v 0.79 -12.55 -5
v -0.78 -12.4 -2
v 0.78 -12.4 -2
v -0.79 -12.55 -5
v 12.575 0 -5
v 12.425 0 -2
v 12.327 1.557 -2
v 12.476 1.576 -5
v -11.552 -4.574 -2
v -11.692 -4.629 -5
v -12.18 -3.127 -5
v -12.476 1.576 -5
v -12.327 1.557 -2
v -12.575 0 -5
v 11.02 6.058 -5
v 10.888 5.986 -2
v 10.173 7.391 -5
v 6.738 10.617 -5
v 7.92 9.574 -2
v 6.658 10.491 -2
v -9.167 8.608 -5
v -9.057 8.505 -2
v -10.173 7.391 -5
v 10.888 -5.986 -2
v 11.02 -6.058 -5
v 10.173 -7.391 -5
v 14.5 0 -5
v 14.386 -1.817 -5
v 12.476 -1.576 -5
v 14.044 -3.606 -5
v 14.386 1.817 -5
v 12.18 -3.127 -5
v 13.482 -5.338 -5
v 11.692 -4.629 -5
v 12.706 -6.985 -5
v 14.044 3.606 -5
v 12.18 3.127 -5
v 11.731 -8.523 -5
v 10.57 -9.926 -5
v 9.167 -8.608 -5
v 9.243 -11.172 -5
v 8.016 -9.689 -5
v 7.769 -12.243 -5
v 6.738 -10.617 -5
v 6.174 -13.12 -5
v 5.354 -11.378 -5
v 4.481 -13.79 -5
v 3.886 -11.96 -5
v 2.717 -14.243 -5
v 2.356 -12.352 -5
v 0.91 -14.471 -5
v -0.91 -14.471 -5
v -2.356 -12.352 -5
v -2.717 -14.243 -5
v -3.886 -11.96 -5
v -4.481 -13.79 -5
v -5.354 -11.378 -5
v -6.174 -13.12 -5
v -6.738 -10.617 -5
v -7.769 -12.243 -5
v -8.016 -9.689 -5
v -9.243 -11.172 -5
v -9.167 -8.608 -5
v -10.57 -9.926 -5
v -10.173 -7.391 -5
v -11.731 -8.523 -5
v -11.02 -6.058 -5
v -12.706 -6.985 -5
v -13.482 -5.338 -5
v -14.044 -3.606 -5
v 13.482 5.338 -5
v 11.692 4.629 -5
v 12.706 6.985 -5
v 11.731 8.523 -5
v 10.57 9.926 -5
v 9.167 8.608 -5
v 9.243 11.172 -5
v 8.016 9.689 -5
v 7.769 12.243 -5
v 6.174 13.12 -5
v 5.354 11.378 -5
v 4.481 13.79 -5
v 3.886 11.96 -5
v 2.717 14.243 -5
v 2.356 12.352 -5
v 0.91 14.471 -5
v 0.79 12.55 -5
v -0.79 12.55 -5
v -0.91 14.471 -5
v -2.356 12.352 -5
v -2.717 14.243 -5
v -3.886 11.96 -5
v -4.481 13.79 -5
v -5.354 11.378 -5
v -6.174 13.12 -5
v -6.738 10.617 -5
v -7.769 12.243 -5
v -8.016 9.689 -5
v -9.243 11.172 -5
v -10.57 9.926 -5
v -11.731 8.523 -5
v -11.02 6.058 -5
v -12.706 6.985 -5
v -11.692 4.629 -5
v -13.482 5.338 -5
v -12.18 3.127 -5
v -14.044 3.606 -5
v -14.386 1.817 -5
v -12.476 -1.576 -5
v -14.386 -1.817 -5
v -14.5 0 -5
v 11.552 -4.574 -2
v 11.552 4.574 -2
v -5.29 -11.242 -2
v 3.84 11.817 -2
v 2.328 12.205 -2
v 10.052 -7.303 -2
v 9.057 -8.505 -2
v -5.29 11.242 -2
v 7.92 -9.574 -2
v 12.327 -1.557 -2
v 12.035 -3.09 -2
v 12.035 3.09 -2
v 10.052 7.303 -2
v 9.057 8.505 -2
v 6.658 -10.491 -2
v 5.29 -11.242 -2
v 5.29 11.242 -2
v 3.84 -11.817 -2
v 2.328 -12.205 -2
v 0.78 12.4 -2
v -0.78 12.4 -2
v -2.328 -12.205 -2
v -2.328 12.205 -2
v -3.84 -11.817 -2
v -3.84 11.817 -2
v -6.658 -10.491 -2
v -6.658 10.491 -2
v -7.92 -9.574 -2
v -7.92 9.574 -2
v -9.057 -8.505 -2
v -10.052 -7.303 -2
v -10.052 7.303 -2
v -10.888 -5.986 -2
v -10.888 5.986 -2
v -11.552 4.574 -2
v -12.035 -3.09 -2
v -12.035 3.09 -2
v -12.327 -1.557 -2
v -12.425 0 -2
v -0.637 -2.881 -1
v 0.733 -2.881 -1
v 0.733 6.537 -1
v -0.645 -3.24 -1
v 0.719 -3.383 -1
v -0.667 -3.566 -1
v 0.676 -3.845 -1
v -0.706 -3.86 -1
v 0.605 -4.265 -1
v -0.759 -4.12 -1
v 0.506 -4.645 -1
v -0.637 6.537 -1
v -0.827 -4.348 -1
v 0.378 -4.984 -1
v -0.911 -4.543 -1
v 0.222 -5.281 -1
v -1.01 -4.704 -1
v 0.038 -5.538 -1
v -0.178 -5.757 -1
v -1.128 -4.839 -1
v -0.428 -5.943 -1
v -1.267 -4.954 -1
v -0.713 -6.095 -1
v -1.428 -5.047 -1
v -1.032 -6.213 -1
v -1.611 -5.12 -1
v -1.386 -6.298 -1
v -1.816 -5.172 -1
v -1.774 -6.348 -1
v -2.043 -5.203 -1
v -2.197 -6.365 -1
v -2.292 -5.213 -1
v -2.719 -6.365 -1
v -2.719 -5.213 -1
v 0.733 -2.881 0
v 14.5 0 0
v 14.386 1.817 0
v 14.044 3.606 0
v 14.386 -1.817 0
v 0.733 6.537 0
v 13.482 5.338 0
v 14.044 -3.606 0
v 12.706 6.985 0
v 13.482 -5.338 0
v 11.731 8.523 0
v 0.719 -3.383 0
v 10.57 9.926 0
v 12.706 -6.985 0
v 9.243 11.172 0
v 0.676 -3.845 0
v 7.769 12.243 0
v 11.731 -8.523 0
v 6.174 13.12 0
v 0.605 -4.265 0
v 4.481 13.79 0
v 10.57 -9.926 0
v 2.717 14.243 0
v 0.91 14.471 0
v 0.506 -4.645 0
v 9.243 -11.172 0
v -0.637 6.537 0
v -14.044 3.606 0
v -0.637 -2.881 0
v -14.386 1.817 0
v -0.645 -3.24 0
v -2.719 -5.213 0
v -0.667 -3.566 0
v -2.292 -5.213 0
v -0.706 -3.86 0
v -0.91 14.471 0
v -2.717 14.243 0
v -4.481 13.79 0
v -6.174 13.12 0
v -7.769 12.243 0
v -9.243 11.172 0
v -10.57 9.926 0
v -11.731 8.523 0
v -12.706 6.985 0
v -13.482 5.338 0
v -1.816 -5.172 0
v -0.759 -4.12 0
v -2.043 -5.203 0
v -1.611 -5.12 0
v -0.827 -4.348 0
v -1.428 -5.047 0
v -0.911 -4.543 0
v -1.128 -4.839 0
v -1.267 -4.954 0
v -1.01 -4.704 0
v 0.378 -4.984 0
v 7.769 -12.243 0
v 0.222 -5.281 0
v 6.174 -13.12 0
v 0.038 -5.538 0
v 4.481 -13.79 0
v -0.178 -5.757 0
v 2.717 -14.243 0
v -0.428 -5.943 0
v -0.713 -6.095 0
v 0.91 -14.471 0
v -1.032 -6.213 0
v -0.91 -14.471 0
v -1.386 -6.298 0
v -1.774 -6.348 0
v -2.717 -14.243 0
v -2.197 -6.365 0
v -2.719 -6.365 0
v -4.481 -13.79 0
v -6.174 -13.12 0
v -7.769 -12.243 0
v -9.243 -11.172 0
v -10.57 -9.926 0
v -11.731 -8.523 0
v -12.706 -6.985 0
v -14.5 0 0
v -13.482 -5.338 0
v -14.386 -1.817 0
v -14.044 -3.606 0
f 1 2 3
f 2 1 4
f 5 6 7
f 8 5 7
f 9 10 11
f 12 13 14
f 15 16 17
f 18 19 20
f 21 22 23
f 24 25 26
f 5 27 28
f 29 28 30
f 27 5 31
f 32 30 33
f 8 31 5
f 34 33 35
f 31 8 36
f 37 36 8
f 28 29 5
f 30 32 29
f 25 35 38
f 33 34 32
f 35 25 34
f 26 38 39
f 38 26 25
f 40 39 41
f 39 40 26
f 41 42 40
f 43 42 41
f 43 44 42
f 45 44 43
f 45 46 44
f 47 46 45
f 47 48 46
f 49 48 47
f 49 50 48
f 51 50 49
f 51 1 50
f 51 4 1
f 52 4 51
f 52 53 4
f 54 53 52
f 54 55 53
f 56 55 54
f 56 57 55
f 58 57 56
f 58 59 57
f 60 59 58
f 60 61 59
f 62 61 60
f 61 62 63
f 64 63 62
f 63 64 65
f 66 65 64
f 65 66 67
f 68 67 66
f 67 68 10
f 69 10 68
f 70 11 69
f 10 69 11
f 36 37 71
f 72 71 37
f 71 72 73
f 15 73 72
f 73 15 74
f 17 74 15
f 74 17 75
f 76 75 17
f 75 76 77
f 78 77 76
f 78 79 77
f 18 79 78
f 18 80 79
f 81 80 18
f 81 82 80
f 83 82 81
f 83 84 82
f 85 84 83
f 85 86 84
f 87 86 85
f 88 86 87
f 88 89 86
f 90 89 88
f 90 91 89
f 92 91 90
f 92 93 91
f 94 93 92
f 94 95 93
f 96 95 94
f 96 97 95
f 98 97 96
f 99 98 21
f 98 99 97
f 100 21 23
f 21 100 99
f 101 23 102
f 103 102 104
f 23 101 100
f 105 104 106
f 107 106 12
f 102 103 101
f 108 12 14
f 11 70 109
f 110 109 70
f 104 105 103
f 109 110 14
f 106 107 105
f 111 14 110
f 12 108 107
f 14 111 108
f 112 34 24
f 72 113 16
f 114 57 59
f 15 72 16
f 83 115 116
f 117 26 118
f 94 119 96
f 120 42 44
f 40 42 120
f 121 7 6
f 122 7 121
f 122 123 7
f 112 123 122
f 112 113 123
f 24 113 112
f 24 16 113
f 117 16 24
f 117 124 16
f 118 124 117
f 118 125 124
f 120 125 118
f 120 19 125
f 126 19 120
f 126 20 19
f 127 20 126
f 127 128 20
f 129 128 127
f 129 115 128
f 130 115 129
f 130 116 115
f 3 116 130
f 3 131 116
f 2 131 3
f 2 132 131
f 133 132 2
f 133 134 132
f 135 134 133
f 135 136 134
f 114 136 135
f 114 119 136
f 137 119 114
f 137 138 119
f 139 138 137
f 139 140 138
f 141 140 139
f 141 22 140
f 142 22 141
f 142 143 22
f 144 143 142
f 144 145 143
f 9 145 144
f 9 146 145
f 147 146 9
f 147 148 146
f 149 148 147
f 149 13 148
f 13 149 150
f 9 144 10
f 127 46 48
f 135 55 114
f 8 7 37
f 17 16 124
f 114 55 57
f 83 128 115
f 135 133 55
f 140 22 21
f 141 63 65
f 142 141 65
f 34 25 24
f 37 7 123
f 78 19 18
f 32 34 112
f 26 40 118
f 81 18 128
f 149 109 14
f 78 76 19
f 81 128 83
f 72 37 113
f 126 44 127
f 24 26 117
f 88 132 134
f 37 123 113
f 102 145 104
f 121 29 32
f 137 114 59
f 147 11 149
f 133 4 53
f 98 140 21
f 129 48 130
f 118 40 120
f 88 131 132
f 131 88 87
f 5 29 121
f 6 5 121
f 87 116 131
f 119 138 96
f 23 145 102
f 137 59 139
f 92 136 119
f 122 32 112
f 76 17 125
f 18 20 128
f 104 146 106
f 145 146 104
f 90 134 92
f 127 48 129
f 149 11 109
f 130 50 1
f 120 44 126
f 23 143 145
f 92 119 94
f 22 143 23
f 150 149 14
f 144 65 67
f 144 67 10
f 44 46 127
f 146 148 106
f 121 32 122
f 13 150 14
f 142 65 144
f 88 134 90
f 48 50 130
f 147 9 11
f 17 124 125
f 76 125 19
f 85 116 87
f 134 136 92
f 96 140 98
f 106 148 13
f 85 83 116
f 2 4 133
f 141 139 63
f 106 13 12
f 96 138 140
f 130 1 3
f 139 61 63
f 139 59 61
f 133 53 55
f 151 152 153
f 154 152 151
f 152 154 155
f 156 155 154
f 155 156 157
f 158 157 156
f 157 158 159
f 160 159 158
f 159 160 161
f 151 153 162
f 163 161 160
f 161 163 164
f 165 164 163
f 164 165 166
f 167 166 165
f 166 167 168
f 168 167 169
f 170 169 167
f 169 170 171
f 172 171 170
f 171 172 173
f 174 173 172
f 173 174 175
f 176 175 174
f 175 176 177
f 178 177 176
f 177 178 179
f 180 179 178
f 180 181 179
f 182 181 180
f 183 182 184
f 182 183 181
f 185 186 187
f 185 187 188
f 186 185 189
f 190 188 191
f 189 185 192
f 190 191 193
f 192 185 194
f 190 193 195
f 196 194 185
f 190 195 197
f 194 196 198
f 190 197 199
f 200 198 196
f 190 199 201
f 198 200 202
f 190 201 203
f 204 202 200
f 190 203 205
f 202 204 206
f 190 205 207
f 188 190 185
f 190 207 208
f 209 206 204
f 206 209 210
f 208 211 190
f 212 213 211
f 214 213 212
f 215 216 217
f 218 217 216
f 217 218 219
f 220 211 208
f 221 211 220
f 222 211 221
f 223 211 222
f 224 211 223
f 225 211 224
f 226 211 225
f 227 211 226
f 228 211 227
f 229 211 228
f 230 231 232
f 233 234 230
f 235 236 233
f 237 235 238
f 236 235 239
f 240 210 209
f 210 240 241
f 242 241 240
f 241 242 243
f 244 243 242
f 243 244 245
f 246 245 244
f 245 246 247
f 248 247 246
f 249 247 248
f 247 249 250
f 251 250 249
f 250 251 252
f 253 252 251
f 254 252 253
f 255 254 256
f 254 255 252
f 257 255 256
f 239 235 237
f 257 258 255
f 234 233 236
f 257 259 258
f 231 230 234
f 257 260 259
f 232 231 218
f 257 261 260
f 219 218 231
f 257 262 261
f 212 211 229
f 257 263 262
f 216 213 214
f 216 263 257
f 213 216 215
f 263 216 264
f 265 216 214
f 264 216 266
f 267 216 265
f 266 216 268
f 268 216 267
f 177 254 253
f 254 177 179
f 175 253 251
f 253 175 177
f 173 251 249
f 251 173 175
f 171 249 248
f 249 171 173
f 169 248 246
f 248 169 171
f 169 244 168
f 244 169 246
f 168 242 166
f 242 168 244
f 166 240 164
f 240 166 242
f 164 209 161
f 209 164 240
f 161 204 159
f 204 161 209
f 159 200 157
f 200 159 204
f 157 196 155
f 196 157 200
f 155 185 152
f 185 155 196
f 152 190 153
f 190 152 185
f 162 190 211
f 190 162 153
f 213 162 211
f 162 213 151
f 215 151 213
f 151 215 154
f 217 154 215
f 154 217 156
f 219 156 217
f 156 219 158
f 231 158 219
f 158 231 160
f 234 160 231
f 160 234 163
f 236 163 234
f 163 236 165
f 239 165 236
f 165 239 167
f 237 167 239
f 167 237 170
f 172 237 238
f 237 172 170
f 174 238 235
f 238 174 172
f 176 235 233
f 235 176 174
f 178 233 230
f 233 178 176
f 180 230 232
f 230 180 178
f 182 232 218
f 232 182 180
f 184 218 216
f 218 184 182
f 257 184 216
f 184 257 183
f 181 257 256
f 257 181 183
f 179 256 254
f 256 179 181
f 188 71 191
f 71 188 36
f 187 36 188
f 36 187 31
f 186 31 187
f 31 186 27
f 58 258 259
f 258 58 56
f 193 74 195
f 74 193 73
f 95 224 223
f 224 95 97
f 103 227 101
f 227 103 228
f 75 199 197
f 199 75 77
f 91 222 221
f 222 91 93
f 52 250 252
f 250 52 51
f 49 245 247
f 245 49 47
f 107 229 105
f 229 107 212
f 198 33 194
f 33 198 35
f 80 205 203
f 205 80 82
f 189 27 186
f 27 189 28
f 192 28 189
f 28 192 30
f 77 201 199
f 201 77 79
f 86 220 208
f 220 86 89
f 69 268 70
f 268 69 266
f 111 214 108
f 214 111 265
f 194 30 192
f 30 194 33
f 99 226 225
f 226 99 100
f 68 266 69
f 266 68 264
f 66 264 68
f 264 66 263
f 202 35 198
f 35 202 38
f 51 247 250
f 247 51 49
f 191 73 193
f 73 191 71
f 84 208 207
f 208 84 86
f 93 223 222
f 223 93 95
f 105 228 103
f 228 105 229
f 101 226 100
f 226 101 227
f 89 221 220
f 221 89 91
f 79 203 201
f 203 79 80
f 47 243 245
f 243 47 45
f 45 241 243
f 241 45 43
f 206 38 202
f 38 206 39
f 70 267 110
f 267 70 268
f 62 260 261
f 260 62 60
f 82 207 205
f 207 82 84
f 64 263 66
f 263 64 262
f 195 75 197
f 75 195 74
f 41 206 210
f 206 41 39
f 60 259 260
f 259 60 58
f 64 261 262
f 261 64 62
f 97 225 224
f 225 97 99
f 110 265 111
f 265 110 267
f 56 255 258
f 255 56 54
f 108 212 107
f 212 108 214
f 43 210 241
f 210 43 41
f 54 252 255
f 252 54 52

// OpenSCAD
$fn = 50;

difference() {
	union() {
		translate(v = [0, 0, -5.0]) {
			cylinder(h = 5, r = 14.5);
		}
	}
	union() {
		#translate(v = [0, 0, -5.0]) {
			cylinder(h = 3, r1 = 12.575, r2 = 12.425);
		}
		translate(v = [0, 0, -1]) {
			linear_extrude(height = 1) {
				text(font = "Impact", halign = "center", size = 10, text = "J", valign = "center");
			}
		}
	}
}
